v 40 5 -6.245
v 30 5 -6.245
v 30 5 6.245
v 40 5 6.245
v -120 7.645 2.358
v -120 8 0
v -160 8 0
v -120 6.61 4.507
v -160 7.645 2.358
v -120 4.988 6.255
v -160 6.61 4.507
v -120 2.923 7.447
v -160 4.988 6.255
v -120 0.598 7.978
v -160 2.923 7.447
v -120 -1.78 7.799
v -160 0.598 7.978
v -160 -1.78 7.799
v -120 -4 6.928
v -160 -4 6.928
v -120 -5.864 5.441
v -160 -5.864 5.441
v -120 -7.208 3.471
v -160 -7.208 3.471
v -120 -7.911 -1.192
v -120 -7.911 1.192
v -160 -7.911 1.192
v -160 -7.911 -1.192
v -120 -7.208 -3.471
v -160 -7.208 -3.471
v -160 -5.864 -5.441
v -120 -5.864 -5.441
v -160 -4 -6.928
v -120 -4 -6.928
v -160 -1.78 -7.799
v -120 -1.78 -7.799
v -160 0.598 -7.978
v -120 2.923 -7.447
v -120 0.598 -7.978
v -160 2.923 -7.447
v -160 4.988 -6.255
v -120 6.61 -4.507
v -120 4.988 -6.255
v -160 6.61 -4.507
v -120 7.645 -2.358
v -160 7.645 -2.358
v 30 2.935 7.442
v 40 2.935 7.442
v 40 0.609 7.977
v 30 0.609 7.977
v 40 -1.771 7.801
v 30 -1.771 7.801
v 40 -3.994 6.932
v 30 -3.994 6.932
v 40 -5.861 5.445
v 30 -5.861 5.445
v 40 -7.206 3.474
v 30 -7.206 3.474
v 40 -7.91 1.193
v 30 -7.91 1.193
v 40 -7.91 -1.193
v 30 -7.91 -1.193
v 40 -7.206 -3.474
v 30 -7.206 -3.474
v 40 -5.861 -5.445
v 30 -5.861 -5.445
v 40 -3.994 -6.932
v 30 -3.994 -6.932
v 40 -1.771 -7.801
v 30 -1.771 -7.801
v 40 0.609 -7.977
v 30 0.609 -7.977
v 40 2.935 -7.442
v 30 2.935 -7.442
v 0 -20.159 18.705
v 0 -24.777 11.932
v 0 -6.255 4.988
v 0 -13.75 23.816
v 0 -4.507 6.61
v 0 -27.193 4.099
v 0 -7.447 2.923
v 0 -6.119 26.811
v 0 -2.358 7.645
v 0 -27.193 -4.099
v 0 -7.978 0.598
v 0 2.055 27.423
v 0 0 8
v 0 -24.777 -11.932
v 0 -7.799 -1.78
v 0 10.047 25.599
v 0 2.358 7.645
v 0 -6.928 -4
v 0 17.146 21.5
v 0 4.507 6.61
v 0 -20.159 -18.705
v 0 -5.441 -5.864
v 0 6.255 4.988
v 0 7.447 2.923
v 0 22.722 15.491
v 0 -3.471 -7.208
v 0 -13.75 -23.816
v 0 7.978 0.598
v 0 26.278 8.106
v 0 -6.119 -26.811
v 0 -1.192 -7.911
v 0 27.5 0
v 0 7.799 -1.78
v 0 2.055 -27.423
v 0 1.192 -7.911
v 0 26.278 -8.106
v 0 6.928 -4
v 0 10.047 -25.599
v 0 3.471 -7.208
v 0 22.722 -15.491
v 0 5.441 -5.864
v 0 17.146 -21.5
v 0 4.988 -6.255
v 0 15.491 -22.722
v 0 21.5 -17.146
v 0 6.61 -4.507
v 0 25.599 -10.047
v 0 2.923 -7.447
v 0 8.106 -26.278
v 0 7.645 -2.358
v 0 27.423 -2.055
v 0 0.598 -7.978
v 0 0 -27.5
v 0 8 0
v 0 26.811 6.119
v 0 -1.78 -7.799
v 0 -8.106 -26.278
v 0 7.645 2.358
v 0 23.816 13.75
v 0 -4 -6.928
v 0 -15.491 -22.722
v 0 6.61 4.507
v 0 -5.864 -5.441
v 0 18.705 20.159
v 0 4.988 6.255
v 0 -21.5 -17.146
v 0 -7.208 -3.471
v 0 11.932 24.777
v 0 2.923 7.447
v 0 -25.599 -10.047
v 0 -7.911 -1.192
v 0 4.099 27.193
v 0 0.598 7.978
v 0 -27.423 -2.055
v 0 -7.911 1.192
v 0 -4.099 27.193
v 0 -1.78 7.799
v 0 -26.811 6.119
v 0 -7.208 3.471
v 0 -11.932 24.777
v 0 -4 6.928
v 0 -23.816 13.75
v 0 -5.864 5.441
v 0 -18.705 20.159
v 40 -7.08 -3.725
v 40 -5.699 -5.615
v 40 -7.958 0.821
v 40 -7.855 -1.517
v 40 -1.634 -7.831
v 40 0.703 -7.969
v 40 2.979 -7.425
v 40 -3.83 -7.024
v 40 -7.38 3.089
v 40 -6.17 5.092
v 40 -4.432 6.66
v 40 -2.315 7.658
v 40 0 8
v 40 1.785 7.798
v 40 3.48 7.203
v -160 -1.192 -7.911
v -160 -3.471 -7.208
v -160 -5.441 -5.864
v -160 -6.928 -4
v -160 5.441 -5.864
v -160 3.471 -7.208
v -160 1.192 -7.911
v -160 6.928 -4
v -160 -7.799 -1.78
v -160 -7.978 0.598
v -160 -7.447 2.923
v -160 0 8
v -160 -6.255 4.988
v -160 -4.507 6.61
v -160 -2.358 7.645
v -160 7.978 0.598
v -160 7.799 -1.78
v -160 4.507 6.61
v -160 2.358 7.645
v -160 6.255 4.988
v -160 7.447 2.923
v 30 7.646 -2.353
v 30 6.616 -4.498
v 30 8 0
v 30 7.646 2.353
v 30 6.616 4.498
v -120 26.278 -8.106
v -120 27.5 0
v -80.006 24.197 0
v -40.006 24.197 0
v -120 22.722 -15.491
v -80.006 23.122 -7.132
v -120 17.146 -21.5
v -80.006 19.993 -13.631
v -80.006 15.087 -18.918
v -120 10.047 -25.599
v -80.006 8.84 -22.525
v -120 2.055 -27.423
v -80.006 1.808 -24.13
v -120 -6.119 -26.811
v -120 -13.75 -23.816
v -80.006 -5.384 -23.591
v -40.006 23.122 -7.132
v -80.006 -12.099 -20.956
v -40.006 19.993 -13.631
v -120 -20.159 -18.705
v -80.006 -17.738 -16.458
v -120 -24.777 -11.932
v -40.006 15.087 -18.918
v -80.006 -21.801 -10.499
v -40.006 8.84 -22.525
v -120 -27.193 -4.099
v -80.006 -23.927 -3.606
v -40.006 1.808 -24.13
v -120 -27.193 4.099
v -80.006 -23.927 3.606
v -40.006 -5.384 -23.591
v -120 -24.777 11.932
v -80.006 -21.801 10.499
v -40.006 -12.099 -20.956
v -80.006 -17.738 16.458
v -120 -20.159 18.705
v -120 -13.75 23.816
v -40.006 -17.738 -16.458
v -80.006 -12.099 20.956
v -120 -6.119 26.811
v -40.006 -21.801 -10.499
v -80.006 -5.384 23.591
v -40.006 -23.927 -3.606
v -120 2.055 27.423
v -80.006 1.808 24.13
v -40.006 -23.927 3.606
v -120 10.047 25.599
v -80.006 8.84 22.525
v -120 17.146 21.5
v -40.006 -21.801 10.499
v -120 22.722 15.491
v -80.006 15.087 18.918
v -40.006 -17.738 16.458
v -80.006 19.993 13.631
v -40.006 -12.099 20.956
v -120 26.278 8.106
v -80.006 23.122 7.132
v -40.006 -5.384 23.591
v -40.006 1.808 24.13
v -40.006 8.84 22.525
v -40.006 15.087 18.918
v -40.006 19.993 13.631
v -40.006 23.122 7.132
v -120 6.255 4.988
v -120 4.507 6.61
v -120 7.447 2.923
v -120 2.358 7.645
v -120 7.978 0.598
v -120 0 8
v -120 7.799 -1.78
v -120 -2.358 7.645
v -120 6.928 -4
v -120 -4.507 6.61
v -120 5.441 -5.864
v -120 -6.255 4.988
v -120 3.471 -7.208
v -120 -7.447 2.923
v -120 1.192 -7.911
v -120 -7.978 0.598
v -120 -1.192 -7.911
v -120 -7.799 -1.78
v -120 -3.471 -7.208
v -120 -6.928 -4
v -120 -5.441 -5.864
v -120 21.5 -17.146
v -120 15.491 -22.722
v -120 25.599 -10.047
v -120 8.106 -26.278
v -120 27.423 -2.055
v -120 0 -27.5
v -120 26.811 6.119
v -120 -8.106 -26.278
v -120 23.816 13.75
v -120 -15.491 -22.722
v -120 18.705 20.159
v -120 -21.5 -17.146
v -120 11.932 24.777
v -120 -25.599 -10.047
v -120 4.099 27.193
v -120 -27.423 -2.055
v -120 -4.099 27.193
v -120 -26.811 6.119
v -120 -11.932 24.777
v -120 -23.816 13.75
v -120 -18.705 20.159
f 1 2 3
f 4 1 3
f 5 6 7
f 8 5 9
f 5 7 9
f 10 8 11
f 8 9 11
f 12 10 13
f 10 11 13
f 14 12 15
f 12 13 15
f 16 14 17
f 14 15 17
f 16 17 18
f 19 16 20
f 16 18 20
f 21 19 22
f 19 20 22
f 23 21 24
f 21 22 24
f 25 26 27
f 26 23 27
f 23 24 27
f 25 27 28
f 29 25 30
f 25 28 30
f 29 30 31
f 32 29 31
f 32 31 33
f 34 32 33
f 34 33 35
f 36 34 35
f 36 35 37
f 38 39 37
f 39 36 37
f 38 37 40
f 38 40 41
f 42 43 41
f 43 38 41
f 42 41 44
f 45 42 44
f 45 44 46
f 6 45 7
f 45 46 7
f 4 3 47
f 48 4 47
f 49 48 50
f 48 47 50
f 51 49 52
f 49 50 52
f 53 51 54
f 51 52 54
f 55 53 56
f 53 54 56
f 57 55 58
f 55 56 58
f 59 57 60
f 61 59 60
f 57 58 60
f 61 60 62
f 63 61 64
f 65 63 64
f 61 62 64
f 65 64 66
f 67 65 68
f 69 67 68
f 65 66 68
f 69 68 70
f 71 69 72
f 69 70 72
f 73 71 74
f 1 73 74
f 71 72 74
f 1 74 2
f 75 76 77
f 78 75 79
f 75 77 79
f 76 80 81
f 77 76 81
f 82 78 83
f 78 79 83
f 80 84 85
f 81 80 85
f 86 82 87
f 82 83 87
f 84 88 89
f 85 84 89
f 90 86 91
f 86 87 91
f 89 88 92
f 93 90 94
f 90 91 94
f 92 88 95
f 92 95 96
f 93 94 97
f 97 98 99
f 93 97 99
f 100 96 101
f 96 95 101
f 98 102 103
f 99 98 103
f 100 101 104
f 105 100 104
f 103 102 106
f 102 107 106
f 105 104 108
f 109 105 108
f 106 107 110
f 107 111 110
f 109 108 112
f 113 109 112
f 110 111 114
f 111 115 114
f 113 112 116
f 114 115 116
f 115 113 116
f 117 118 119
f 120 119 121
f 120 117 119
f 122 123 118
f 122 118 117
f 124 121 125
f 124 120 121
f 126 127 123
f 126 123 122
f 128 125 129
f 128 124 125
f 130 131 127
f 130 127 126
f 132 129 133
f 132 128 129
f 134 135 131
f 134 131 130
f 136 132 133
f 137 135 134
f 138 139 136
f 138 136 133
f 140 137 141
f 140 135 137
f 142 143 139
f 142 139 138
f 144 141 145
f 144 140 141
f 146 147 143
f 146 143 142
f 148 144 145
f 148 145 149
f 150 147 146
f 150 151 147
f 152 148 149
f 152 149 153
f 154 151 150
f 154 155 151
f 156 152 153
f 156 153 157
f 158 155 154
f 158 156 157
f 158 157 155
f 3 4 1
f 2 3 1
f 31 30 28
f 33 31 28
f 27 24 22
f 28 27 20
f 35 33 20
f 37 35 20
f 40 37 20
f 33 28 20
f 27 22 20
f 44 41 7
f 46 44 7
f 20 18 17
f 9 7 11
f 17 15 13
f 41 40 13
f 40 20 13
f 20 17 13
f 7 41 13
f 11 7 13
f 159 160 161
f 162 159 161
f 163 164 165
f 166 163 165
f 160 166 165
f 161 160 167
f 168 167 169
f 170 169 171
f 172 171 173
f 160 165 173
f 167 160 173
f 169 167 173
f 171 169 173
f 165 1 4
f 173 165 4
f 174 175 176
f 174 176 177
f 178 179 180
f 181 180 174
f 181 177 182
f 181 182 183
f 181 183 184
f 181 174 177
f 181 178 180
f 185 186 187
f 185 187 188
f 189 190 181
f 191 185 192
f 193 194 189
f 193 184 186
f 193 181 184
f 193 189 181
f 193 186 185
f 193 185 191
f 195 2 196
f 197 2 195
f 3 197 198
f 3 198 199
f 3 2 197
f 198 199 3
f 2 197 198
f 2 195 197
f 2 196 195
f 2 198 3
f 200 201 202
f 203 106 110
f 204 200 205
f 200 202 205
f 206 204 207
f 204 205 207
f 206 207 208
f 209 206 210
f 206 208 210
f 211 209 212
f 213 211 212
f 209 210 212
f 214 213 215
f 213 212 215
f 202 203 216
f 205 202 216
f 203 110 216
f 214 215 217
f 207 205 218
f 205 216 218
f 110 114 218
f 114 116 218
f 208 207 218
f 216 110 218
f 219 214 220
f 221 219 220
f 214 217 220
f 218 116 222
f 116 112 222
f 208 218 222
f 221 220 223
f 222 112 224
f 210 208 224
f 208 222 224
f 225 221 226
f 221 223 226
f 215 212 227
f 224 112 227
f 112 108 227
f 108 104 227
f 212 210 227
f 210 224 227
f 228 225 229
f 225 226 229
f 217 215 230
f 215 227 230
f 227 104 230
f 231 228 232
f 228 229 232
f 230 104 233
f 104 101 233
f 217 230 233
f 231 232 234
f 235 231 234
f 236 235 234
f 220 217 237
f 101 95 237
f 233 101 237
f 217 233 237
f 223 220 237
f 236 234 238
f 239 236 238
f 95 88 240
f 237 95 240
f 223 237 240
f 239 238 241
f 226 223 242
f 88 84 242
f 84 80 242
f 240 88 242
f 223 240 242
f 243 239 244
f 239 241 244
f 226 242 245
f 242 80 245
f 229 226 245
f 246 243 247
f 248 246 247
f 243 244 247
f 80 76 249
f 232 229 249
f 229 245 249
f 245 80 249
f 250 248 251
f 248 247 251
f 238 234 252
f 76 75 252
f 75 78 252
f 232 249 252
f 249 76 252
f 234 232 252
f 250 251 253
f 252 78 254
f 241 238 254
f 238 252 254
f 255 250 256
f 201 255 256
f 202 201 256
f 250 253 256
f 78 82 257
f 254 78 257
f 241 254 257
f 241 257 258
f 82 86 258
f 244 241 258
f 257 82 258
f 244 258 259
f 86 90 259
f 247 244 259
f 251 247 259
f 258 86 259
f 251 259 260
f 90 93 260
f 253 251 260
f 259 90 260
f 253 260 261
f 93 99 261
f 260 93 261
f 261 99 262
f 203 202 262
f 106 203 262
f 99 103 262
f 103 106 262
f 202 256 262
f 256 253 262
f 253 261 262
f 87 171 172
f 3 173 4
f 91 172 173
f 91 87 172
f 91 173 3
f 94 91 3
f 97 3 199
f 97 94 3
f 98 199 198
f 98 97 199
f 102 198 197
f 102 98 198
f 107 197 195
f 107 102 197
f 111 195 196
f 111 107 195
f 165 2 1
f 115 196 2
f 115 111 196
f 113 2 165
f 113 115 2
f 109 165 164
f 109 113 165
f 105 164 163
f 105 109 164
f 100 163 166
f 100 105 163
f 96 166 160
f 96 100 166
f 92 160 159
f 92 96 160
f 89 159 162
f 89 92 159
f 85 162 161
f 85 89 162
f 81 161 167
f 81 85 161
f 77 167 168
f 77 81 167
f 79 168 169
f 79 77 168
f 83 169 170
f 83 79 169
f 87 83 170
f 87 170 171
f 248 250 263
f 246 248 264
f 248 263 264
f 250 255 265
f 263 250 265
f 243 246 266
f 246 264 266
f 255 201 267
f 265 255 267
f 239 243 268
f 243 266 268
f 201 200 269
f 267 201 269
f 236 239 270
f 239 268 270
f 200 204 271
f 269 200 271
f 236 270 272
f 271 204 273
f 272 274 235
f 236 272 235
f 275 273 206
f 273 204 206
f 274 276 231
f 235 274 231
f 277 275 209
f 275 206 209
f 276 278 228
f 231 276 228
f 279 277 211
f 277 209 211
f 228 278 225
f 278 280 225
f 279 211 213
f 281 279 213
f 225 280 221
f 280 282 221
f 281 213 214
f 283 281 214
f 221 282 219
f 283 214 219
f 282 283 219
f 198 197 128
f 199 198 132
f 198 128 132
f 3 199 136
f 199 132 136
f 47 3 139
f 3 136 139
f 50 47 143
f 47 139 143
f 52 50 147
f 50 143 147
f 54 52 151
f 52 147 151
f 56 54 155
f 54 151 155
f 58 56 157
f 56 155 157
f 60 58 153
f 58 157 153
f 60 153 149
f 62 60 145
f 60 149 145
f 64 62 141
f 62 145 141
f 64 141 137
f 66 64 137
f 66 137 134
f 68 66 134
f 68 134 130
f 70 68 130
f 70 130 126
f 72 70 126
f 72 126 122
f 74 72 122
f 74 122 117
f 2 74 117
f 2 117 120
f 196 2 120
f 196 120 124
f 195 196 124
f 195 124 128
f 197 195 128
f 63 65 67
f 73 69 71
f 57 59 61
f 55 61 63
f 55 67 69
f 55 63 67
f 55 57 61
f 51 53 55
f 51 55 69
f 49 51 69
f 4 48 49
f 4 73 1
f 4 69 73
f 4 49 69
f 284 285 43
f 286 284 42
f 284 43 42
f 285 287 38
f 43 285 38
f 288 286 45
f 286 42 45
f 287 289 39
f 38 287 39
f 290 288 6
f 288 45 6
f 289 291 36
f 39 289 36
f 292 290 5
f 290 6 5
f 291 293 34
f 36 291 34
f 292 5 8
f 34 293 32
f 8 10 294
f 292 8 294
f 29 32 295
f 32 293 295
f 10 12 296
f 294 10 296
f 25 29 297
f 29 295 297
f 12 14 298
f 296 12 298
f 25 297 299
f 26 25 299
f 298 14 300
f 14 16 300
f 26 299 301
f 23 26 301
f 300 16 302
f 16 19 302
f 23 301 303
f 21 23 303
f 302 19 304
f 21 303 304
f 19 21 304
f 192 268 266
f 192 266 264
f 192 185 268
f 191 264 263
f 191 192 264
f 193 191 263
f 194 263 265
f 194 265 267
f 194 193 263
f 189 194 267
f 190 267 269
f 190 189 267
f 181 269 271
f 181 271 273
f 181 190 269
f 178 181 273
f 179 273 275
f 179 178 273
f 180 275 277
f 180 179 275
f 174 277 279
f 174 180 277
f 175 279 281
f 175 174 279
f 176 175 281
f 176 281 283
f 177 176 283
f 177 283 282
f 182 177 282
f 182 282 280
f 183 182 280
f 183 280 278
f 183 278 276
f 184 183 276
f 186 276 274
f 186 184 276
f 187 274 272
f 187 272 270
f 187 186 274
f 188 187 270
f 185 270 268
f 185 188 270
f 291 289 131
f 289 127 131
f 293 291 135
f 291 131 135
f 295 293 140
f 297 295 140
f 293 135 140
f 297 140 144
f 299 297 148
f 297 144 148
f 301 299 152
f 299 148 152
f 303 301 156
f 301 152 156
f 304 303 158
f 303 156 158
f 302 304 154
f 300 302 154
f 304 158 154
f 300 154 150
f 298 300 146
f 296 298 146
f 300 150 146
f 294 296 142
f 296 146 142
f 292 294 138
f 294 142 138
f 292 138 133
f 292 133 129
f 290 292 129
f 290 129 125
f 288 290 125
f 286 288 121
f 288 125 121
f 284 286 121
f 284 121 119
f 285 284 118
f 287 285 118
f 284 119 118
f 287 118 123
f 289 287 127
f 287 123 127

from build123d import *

# Parameters (mm, degrees)
SKETCH2_W                 = 120
SKETCH2_H                 = 27.5
SKETCH4_R                 = 8
BOSS_EXTRUDE1_DEPTH       = 100
SKETCH5_W                 = 26
SKETCH5_H                 = 5
CUT_EXTRUDE1_DEPTH        = 10
BODY_MOVE_COPY1_START     = -160
BODY_MOVE_COPY1_OUTLINE_R = 8
BODY_MOVE_COPY1_DEPTH     = 190
BODY_MOVE_COPY1_START_2   = 30
BODY_MOVE_COPY1_2_DEPTH   = 10


# Read off the part's stored shape, not the designer's step: Body-Move/Copy1
with BuildPart() as part:
    # Sketch1 → Revolve1 (revolve)
    with BuildSketch(Plane.XY):
        with BuildLine():
            Line((0, 0), (-120, 0))
            Line((-120, 0), (-120, 27.5))
            add(Edge.make_bspline(
                [(-120, 27.5), (-80.008293057, 22.546130336), (-40.008293057, 22.546130336), (0, 27.5)],
                knots=[0, 0, 0, 0, 1, 1, 1, 1], degree=3))
            Line((0, 27.5), (0, 0))
        make_face()
    revolve(axis=Axis((-120, 0, 0), (-1, 0, 0)))


with BuildPart() as body_2:
    # Sketch2 → Revolve2 (revolve)
    with BuildSketch(Plane.XY, mode=Mode.PRIVATE) as revolve2_sk:
        with Locations((-60, 13.75)):
            Rectangle(SKETCH2_W, SKETCH2_H)
    revolve(revolve2_sk.sketch.rotate(Axis((0, 0, 0), (-1, 0, 0)), 90), axis=Axis((0, 0, 0), (-1, 0, 0)))


with BuildPart() as body_3:
    # Sketch4 → Boss-Extrude1 (new, symmetric)
    with BuildSketch(Plane.ZY.offset(60)):
        Circle(SKETCH4_R)
    extrude(amount=BOSS_EXTRUDE1_DEPTH, both=True)

    # Sketch5 → Cut-Extrude1 (cut)
    with BuildSketch(Plane(origin=(40, 0, 0), x_dir=(0, 0, -1), z_dir=(1, 0, 0))):
        with Locations((0, 7.5)):
            Rectangle(SKETCH5_W, SKETCH5_H)
    extrude(amount=-CUT_EXTRUDE1_DEPTH, mode=Mode.SUBTRACT)

    # Combine1: union part
    add(part.part)


with BuildPart() as body_4:
    # Body-Move/Copy1 outline → Body-Move/Copy1 (new body)
    with BuildSketch(Plane.YZ.offset(BODY_MOVE_COPY1_START)):
        Circle(BODY_MOVE_COPY1_OUTLINE_R)
    extrude(amount=BODY_MOVE_COPY1_DEPTH)

    # Body-Move_Copy1 2 outline → Body-Move_Copy1 2 (add)
    with BuildSketch(Plane.YZ.offset(BODY_MOVE_COPY1_START_2)):
        with BuildLine():
            Line((5, -6.244997998), (5, 6.244997998))
            ThreePointArc((5, 6.244997998), (-8, 0), (5, -6.244997998))
        make_face()
    extrude(amount=BODY_MOVE_COPY1_2_DEPTH)


with BuildPart() as body_2_1:
    add(body_2.part)

    # Combine2: union body 4
    add(body_4.part)


solid = Compound([body_3.part, body_2_1.part])
